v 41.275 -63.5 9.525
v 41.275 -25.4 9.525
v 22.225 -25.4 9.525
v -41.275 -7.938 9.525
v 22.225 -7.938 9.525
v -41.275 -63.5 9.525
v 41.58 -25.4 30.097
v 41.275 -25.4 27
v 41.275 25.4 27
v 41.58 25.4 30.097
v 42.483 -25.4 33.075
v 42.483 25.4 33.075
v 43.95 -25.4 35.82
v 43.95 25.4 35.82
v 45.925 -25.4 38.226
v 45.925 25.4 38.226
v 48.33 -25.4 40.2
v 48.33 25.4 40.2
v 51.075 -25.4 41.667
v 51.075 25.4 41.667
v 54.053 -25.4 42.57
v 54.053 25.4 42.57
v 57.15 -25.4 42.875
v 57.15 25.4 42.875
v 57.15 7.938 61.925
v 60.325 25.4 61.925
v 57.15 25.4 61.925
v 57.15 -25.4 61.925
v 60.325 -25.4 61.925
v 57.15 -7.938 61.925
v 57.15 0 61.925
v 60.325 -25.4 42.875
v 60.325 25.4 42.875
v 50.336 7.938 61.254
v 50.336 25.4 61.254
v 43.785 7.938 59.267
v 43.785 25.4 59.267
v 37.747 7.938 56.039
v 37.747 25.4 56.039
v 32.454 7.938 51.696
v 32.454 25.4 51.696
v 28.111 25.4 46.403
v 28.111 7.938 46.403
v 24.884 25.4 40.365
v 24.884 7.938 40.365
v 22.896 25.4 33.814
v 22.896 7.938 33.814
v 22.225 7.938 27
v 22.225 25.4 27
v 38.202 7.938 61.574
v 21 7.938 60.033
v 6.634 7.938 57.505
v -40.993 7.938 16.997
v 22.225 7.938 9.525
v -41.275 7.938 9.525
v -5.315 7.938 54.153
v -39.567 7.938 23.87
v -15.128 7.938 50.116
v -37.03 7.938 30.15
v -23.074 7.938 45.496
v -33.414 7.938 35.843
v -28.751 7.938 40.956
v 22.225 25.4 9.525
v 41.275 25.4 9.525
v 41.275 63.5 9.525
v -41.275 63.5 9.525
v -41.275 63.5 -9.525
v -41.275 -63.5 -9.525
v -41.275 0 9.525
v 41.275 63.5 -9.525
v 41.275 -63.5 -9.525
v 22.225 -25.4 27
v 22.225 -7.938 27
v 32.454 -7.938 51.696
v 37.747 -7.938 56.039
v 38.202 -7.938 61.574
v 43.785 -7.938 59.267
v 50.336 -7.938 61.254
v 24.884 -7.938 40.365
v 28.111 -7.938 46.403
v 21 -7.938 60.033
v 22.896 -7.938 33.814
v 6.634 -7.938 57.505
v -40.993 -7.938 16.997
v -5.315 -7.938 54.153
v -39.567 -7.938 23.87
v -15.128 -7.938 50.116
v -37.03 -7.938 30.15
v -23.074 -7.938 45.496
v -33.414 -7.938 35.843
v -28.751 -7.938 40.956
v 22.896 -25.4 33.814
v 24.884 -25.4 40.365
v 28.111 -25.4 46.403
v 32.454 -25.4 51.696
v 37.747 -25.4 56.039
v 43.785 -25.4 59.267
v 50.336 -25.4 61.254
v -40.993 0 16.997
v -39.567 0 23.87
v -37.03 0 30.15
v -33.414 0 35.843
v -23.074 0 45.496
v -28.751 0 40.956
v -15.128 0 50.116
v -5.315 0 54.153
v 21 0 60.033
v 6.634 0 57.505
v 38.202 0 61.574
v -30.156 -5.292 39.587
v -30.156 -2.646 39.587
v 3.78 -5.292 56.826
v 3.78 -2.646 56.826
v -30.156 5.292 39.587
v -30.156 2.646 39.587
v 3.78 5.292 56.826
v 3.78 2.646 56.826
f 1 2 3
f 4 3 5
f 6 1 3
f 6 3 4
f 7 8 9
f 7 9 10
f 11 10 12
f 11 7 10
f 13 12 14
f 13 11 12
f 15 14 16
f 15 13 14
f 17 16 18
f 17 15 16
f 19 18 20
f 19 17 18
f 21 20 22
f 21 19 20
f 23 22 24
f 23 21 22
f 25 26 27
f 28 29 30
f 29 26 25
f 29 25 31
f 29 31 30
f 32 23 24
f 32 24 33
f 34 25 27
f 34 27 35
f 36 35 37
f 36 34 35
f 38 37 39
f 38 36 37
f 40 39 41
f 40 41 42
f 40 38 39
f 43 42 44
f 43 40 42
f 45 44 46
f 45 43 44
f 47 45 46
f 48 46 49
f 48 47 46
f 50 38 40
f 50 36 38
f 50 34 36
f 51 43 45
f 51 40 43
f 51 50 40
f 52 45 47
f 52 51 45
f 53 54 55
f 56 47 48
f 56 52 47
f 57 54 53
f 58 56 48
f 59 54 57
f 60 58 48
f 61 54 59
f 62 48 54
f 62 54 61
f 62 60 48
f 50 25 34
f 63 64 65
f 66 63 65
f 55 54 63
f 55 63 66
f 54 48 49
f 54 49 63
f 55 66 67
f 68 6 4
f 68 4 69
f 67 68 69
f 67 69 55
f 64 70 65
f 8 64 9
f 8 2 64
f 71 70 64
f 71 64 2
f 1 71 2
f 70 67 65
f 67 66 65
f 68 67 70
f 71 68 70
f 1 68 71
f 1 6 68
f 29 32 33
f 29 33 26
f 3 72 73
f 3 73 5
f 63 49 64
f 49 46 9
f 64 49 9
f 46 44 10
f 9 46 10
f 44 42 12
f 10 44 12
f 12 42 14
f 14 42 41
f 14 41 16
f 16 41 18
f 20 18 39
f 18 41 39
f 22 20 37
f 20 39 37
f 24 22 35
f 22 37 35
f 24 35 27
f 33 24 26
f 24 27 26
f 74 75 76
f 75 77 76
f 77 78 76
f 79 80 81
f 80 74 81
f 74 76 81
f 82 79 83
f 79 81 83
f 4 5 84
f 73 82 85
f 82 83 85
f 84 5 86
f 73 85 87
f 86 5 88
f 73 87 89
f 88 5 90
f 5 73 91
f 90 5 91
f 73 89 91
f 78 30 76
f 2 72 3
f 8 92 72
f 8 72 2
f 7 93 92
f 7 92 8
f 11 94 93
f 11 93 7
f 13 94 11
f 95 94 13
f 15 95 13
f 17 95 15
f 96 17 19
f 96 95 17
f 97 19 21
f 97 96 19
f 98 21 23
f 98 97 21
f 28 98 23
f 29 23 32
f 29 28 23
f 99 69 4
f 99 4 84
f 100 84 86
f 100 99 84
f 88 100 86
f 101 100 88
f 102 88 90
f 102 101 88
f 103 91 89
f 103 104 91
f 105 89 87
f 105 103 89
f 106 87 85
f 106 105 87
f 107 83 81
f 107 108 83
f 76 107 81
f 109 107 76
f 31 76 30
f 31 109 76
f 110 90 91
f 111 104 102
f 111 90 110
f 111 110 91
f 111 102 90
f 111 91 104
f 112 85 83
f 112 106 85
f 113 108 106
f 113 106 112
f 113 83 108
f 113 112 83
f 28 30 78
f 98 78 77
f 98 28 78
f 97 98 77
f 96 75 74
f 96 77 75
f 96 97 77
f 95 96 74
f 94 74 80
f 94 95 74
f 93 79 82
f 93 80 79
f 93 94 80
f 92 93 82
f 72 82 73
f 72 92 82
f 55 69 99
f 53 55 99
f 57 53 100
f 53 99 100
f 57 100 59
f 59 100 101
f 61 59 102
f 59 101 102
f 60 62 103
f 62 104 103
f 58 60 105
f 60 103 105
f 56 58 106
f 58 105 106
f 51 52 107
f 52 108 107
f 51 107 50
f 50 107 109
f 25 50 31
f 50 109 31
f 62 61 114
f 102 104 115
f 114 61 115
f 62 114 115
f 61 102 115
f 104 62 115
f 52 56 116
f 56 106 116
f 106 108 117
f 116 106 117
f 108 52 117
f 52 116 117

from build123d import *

# Parameters (mm, degrees)
F1_DEPTH = 63.5
F2_DEPTH = 25.4
F3_DEPTH = 7.9375


with BuildPart() as f1:
    # F0 (on Front) → F1 (new body, symmetric)
    with BuildSketch(Plane.XZ):
        Polygon((-41.275, -9.525), (41.275, -9.525), (41.275, 9.525), (22.225, 9.525), (-41.275, 9.525), align=None)
    extrude(amount=F1_DEPTH, both=True)

    # F0 (on Front) → F2 (join, symmetric)
    with BuildSketch(Plane.XZ):
        with BuildLine():
            Line((22.225, 9.525), (41.275, 9.525))
            Line((41.275, 9.525), (41.275, 27.0002))
            ThreePointArc((41.275, 27.0002), (45.92468, 38.22552), (57.15, 42.8752))
            Line((57.15, 42.8752), (60.325, 42.8752))
            Line((60.325, 42.8752), (60.325, 61.9252))
            Line((60.325, 61.9252), (57.15, 61.9252))
            ThreePointArc((57.15, 61.9252), (32.454296, 51.695904), (22.225, 27.0002))
            Line((22.225, 27.0002), (22.225, 9.525))
        make_face()
    extrude(amount=F2_DEPTH, both=True)

    # F0 (on Front) → F3 (join, symmetric)
    with BuildSketch(Plane.XZ):
        with BuildLine():
            add(Edge.make_bspline(
                [(-41.275, 9.525), (-42.692475, 46.227396), (-4.809058, 62.667362), (57.15, 61.9252)],
                knots=[0, 0, 0, 0, 111.504536, 111.504536, 111.504536, 111.504536], degree=3))
            Line((-41.275, 9.525), (22.225, 9.525))
            Line((22.225, 9.525), (22.225, 27.0002))
            ThreePointArc((22.225, 27.0002), (32.454296, 51.695904), (57.15, 61.9252))
        make_face()
    extrude(amount=F3_DEPTH, both=True)


solid = f1.part
